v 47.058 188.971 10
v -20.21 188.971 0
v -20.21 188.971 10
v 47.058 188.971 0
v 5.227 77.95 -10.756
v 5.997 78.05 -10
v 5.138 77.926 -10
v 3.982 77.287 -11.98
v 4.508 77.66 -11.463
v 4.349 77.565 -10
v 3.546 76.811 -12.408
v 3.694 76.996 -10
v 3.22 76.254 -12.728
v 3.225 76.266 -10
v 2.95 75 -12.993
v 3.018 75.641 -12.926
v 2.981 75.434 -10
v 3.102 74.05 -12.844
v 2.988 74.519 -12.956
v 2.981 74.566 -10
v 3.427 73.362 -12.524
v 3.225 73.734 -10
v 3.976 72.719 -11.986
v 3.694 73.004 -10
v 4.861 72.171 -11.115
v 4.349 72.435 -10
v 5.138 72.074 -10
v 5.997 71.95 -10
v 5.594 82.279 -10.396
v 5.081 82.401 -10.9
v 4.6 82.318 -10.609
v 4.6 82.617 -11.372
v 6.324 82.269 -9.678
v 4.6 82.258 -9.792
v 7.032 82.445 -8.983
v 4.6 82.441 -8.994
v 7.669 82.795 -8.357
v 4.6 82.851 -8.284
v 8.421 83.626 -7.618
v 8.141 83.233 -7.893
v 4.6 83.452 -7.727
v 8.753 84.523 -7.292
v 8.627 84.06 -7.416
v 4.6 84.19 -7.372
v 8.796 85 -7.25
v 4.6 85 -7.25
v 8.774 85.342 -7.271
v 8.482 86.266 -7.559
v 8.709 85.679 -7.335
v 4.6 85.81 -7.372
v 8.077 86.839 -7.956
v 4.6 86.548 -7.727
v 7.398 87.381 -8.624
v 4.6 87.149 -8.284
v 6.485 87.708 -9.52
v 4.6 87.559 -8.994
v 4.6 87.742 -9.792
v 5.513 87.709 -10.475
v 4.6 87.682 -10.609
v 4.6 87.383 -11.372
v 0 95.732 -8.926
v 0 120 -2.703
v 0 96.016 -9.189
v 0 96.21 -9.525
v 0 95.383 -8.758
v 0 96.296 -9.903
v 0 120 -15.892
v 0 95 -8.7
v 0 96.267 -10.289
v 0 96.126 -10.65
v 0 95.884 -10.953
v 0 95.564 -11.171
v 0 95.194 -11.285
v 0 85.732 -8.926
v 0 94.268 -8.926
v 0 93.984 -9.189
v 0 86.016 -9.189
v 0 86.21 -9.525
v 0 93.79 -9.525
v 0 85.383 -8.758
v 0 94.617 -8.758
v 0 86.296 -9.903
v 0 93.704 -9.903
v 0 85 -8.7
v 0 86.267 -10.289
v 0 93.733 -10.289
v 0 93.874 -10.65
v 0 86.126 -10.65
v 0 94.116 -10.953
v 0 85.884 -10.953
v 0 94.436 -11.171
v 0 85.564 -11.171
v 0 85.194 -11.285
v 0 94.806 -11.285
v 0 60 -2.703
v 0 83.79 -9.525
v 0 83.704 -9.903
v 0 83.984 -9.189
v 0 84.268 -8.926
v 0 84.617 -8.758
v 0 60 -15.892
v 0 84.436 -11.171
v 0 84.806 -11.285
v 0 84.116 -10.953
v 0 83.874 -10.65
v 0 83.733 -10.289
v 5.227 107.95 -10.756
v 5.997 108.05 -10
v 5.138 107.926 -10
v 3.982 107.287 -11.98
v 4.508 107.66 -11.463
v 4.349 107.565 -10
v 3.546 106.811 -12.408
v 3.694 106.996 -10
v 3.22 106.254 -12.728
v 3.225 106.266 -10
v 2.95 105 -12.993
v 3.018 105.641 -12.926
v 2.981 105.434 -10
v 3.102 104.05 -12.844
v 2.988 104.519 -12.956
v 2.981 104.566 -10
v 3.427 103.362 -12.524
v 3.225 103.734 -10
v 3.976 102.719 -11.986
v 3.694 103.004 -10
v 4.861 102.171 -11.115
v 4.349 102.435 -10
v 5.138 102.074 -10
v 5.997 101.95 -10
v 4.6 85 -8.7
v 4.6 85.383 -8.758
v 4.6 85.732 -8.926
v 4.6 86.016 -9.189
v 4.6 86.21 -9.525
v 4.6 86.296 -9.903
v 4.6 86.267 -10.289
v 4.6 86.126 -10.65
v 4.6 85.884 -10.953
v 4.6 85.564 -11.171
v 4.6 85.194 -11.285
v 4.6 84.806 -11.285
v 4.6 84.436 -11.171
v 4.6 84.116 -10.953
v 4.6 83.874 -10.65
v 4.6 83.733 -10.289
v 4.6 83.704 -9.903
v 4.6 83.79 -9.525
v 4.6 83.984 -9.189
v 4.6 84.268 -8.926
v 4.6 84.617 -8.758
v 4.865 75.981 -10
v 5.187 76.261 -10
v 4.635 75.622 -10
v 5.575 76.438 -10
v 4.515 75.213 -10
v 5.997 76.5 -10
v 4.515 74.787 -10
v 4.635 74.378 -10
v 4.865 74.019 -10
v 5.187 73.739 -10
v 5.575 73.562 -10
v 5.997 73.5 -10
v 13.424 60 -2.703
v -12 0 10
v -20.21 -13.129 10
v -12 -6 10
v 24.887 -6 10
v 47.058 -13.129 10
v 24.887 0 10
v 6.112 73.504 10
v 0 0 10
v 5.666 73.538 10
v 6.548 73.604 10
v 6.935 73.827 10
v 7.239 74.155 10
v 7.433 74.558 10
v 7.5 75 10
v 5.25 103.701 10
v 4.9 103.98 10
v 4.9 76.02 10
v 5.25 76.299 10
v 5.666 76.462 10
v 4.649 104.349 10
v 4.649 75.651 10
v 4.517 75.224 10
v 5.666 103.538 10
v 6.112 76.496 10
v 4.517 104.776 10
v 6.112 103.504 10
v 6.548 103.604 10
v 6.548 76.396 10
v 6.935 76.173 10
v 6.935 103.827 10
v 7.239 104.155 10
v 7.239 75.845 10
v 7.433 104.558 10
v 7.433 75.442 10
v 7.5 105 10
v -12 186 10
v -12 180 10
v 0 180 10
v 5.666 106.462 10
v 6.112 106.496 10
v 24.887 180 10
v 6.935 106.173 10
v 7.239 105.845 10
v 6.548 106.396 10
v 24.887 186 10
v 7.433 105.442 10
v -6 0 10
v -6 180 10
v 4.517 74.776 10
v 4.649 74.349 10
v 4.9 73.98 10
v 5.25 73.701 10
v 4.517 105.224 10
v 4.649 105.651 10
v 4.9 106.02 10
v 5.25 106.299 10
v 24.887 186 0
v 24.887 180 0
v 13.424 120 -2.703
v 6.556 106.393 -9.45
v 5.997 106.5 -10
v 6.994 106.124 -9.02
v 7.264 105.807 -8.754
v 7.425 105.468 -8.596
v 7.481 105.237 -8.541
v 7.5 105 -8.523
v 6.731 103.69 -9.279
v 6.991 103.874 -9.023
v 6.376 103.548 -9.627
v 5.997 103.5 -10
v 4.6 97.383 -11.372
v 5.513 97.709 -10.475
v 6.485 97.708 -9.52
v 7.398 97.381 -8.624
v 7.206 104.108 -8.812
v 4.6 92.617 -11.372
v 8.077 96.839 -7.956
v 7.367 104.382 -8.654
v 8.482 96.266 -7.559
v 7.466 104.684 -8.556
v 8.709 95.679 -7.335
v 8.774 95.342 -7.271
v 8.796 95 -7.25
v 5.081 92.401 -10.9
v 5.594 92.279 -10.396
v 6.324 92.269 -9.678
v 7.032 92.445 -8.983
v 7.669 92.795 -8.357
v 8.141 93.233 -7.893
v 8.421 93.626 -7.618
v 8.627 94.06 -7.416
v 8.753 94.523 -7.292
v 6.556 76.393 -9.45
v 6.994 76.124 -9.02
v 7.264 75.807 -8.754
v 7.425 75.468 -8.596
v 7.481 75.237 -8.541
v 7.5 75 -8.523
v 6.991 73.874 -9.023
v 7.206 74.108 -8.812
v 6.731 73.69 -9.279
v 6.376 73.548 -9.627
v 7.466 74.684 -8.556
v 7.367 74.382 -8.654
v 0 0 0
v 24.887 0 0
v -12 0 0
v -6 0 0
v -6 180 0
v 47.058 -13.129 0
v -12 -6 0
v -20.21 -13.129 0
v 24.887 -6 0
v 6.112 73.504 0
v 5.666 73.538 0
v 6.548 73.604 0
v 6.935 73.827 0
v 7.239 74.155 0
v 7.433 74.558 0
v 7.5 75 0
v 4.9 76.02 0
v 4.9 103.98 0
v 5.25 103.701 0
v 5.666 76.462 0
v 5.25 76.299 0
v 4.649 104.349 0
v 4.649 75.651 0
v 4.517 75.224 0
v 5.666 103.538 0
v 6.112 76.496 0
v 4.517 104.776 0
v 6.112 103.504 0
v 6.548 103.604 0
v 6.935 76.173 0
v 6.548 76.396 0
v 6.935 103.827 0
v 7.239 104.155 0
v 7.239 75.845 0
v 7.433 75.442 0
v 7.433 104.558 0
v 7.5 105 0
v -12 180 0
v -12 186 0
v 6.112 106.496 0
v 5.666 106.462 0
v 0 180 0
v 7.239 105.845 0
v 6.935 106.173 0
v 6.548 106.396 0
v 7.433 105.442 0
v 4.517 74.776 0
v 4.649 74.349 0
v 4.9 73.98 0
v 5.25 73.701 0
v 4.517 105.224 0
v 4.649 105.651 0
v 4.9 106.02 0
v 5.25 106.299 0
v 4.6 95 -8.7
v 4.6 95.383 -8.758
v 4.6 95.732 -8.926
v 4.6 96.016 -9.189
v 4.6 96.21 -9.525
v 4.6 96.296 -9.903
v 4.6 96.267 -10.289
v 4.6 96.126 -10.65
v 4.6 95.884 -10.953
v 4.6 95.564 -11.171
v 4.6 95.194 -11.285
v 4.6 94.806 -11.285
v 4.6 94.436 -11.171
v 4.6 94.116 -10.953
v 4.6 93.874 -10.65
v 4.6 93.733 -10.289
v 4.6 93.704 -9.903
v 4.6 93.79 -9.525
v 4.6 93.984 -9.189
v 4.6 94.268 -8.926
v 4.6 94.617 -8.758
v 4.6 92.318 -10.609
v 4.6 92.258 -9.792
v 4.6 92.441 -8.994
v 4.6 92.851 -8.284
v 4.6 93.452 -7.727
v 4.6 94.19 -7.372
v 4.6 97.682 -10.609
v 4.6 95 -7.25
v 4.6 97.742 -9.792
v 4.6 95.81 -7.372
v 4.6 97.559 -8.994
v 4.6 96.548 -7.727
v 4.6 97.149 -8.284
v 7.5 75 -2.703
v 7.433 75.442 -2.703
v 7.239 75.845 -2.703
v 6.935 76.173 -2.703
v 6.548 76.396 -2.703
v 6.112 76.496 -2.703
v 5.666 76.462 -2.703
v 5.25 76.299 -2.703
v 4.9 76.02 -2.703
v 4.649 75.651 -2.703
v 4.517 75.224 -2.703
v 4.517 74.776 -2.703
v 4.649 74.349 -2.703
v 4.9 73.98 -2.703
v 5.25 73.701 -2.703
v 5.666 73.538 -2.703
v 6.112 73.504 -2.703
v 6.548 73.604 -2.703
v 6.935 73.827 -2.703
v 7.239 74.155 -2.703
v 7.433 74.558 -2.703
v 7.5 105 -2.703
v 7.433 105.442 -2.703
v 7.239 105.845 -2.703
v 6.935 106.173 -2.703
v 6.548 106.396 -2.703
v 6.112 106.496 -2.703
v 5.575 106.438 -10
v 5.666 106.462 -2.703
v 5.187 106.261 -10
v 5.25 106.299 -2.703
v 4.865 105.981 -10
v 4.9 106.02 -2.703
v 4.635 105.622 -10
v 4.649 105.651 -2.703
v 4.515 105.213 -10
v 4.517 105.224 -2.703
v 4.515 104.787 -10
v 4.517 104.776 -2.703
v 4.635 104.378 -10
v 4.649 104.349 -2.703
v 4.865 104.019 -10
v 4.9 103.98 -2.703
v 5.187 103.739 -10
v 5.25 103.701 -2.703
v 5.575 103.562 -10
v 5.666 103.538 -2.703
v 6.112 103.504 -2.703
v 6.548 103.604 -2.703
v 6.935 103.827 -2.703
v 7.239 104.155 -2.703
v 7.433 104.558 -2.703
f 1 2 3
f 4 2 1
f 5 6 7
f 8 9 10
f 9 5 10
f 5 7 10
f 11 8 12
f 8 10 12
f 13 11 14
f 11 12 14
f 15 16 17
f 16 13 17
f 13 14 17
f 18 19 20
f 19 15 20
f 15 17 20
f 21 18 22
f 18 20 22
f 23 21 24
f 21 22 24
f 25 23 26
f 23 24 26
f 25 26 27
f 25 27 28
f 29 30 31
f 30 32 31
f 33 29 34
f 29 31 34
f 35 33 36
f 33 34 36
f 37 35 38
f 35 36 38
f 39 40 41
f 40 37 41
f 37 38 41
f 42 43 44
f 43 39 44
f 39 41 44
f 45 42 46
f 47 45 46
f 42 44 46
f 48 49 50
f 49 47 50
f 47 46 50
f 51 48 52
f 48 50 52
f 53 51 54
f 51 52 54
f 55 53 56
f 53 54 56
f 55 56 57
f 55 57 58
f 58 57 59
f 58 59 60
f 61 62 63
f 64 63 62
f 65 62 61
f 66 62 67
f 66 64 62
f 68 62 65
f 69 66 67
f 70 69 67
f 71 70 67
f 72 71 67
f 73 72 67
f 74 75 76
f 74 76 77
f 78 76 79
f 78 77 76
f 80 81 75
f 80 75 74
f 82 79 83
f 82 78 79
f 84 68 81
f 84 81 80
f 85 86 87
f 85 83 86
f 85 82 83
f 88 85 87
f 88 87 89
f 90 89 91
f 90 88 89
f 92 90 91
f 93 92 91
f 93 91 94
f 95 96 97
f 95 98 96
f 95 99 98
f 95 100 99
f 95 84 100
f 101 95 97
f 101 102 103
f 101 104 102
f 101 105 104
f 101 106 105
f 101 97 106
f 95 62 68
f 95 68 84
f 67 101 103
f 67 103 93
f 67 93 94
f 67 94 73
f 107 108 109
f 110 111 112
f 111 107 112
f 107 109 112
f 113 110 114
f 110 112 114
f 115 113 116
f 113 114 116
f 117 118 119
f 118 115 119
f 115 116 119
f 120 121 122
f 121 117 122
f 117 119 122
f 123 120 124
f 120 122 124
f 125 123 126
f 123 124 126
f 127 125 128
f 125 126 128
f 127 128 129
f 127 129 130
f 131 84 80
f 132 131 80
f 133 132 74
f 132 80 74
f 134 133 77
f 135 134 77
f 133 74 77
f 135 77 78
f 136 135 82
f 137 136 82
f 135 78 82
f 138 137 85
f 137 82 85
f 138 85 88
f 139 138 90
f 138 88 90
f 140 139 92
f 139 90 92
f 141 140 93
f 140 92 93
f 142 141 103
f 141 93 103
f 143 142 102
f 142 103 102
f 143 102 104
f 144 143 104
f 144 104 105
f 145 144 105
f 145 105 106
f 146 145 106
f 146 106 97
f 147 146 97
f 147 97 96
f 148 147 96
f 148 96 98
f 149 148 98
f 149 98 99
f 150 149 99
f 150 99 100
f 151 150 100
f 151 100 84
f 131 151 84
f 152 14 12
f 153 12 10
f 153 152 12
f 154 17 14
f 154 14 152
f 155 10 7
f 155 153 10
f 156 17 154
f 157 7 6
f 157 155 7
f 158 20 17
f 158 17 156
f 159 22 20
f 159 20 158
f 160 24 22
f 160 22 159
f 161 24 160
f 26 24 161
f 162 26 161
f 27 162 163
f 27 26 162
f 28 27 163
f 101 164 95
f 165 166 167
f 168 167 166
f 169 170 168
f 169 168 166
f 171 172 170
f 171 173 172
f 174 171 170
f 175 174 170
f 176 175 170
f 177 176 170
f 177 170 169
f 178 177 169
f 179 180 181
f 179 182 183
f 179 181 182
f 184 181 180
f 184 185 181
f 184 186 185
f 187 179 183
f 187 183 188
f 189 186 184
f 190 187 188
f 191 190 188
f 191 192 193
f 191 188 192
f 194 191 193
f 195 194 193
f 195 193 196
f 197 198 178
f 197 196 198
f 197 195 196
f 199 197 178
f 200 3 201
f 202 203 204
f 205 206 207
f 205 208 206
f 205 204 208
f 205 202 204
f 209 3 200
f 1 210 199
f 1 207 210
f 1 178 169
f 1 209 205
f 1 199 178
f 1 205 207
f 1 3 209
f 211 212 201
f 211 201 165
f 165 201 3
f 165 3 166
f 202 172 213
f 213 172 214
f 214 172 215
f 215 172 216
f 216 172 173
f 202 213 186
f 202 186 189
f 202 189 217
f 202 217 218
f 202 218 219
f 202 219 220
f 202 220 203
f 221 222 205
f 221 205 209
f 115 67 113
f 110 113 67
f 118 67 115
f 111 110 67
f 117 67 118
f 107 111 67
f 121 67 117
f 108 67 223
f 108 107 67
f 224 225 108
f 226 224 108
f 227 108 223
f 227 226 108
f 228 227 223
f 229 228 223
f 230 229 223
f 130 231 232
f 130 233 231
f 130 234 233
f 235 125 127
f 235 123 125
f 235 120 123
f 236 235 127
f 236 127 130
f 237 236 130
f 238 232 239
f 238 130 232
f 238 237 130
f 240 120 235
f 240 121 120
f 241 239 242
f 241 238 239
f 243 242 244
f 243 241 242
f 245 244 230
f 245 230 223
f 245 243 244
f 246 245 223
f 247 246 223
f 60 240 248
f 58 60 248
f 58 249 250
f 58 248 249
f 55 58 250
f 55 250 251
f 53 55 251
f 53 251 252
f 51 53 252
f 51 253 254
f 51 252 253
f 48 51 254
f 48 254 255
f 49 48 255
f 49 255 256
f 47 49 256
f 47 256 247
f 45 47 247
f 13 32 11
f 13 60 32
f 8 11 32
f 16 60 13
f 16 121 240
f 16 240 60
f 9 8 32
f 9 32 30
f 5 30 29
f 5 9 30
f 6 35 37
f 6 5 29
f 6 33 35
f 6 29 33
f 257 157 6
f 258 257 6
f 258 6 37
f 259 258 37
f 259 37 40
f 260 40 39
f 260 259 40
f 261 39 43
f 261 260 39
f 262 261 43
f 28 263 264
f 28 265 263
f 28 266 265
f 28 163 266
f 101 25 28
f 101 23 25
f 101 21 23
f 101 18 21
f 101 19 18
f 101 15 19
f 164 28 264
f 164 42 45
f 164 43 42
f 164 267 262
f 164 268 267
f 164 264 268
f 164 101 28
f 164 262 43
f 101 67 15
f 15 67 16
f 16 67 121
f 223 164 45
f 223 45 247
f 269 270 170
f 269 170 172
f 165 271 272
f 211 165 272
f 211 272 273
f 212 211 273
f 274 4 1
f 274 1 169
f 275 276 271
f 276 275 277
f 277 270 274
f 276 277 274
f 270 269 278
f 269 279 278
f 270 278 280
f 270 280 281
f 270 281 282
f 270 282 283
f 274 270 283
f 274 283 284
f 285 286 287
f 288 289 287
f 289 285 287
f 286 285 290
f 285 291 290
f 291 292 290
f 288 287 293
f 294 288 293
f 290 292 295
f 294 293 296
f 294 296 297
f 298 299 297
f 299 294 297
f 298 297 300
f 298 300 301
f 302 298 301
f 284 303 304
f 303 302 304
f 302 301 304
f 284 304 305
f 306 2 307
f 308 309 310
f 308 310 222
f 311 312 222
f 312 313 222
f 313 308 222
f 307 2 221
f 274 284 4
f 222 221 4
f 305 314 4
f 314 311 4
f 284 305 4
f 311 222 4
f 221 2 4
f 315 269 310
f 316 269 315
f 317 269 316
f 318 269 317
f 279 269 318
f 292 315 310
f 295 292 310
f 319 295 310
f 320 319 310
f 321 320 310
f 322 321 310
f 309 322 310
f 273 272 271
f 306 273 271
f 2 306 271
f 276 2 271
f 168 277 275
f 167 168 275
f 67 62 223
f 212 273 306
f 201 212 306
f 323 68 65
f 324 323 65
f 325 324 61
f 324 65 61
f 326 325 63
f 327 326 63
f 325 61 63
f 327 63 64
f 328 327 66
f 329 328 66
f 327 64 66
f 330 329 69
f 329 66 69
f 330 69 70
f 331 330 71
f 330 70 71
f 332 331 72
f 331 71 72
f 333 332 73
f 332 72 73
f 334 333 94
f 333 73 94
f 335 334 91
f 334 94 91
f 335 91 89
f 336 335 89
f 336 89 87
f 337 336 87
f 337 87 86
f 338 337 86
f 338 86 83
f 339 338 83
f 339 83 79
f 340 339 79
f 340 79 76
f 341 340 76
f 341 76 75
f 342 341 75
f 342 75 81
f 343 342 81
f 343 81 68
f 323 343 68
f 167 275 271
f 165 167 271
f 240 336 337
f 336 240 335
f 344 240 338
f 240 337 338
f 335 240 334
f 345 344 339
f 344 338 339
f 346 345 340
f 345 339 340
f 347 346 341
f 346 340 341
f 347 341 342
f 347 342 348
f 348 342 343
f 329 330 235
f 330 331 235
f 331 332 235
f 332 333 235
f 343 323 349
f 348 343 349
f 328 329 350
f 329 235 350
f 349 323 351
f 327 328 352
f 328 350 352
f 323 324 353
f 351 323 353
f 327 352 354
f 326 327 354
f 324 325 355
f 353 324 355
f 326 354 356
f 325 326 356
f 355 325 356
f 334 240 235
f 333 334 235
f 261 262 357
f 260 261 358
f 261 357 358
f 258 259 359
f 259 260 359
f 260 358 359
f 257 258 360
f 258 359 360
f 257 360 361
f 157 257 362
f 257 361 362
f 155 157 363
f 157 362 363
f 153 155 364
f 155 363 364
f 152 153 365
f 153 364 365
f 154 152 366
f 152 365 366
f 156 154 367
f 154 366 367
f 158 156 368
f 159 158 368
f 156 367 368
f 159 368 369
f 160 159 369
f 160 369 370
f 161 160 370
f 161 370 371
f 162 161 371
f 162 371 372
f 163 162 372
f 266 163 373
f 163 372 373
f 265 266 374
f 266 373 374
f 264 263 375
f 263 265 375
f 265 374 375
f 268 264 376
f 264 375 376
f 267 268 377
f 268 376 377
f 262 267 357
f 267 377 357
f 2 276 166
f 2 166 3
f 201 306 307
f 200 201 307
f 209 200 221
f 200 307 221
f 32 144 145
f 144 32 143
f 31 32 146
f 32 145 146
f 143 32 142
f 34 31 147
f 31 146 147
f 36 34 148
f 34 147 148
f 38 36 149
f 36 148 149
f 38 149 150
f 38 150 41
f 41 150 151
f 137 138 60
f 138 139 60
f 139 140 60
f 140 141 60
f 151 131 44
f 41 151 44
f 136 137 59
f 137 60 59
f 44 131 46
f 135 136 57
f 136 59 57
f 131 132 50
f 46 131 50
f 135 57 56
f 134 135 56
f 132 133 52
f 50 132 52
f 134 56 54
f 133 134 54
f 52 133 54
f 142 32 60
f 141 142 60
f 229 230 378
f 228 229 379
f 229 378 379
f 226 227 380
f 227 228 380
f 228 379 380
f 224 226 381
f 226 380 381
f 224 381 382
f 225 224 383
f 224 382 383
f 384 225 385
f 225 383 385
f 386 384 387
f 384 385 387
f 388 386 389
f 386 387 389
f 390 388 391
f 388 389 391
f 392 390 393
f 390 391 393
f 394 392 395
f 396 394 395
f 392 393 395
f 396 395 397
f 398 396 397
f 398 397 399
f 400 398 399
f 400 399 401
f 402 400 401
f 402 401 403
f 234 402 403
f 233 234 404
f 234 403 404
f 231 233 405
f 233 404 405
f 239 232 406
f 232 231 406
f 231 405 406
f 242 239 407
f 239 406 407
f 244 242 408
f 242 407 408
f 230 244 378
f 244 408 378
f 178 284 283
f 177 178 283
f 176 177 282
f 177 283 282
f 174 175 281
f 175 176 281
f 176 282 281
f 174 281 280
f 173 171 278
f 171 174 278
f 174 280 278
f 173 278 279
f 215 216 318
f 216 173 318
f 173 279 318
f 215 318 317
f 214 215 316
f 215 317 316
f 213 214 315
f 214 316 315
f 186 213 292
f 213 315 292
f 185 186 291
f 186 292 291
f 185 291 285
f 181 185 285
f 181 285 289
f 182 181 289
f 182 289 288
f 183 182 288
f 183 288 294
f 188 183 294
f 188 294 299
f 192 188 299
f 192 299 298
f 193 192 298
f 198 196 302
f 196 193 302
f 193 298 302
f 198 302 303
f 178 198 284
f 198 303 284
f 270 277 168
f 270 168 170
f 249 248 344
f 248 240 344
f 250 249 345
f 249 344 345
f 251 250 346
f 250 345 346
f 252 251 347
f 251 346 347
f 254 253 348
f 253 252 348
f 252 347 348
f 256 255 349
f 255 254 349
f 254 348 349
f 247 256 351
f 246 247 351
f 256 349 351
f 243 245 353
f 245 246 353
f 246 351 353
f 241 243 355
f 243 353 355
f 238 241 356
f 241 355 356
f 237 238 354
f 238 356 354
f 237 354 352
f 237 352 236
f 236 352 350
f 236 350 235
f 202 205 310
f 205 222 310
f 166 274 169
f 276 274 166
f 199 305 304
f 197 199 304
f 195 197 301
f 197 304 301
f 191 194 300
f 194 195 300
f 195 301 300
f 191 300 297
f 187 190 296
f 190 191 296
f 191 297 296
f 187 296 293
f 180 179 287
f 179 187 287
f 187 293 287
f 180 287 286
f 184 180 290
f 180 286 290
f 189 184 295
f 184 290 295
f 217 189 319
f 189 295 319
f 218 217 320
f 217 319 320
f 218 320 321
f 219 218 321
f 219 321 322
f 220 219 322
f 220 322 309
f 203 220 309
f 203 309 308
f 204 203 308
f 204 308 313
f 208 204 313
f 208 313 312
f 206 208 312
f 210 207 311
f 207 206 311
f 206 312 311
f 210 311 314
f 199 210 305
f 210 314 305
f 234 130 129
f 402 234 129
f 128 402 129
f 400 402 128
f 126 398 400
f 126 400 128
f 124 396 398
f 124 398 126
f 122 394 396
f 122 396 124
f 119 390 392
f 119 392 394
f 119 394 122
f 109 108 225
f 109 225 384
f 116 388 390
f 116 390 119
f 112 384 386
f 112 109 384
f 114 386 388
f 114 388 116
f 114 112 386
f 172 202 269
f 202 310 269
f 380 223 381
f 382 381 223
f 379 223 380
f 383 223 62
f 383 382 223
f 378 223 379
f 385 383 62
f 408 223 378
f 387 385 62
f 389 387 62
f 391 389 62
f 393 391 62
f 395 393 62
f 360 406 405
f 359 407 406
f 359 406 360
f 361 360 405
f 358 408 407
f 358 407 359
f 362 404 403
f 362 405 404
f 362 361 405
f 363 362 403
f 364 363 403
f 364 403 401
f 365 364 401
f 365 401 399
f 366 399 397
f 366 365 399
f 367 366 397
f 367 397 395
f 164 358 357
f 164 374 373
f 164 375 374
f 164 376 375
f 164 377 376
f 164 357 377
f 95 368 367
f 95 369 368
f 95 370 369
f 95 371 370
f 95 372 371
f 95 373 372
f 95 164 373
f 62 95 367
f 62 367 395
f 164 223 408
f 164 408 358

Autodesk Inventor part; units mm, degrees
ref_plane "YZ Plane" through (0, 0, 0) normal (1, 0, 0) x (0, 1, 0)
ref_plane "XZ Plane" through (0, 0, 0) normal (0, 1, 0) x (-1, 0, 0)
ref_plane "XY Plane" through (0, 0, 0) normal (0, 0, 1) x (1, 0, 0)
ref_plane "РабПлоскость1" through (0, 0, 0) normal (0, 0, 1) x (1, 0, 0)
sketch "Эскиз1" plane through (0, 0, 0) normal (0, 0, 1) x (1, 0, 0)
  line L0 (-20.21, 188.9707) -> (47.0583, 188.9707)
  line L1 (47.0583, 188.9707) -> (47.0583, -13.1291)
  line L2 (47.0583, -13.1291) -> (-20.21, -13.1291)
  line L3 (-20.21, -13.1291) -> (-20.21, 188.9707)
  line L4 (220, -6) -> (168.1947, -6)
  line L5 (168.1947, 0) -> (168.1947, -6)
  line L6 (168.1947, 0) -> (220, 0)
  line L7 (220, 0) -> (220, -6)
  line L8 (9.8053, -6) -> (-12, -6)
  line L9 (-12, -6) -> (-12, 0)
  line L10 (-12, 0) -> (9.8053, 0)
  line L11 (9.8053, 0) -> (9.8053, -6)
  line L12 (220, 180) -> (168.1947, 180)
  line L13 (168.1947, 186) -> (168.1947, 180)
  line L14 (168.1947, 186) -> (220, 186)
  line L15 (220, 186) -> (220, 180)
  line L16 (9.8053, 180) -> (-12, 180)
  line L17 (-12, 180) -> (-12, 186)
  line L18 (-12, 186) -> (9.8053, 186)
  line L19 (9.8053, 186) -> (9.8053, 180)
  line L20 (0, 180) -> (0, 0)
  line L21 (0, 0) -> (-6, 0)
  line L22 (-6, 0) -> (-6, 180)
  line L23 (-6, 180) -> (0, 180)
  circle A0 centre (-3, 175) radius 1.5
  circle A1 centre (-3, 5) radius 1.5
  line L24 (9.8053, -6) -> (24.8871, -6)
  line L25 (24.8871, -6) -> (24.8871, 0)
  line L26 (24.8871, 0) -> (9.8053, 0)
  line L27 (9.8053, 0) -> (9.8053, -6)
  line L28 (9.8053, 180) -> (24.8871, 180)
  line L29 (24.8871, 180) -> (24.8871, 188.9707)
  line L30 (24.8871, 188.9707) -> (9.8053, 188.9707)
  line L31 (9.8053, 188.9707) -> (9.8053, 180)
  circle A2 centre (6, 75) radius 1.5
  circle A3 centre (6, 105) radius 1.5
  line L32 (-1364.1034, 90) -> (1460.214, 90)
  line L33 (9.8053, 186) -> (24.8871, 186)
  dimension "d0" = 3
  dimension "d1" = 3
  dimension "d2" = 6
  dimension "d3" = 6
  dimension "d4" = 15
  dimension "d5" = 15
ref_plane "РабПлоскость2" through (104, 75, -42) normal (0, 1, 0) x (-1, 0, 0)
sketch "Эскиз2" plane through (104, 75, -42) normal (0, 1, 0) x (-1, 0, 0)
  line L0 (104, 42) -> (104, 26.1085)
  line L1 (104, 26.1085) -> (90.5759, 39.2974)
  line L2 (90.5759, 39.2974) -> (104, 39.2974)
extrude "Выдавливание2" add sketch "Эскиз2" along normal mid plane 30
ref_plane "РабПлоскость3" through (104, 90, -42) normal (0, 1, 0) x (-1, 0, 0)
mirror "Зеркальное отражение1" about plane through (104, 90, -42) normal (0, 1, 0) of "Выдавливание2"
ref_plane "РабПлоскость7" through (0, 0, 0) normal (0, 0, 1) x (1, 0, 0)
sketch "Эскиз3" plane through (0, 0, 0) normal (0, 0, 1) x (1, 0, 0)
  line L0 (47.0583, 188.9707) -> (-20.21, 188.9707) projected
  line L1 (-20.21, 188.9707) -> (-20.21, -13.1291) projected
  line L2 (-20.21, -13.1291) -> (47.0583, -13.1291) projected
  line L3 (47.0583, -13.1291) -> (47.0583, 188.9707) projected
  circle A0 centre (6, 105) radius 1.5 projected
  circle A1 centre (6, 75) radius 1.5 projected
  line L4 (-12, 186) -> (24.8871, 186) projected
  line L5 (24.8871, 186) -> (24.8871, 180) projected
  line L6 (24.8871, 180) -> (0, 180) projected
  line L7 (0, 180) -> (0, 0) projected
  line L8 (0, 0) -> (24.8871, 0) projected
  line L9 (24.8871, 0) -> (24.8871, -6) projected
  line L10 (24.8871, -6) -> (-12, -6) projected
  line L11 (-12, -6) -> (-12, 0) projected
  line L12 (-12, 0) -> (-6, 0) projected
  line L13 (-6, 0) -> (-6, 180) projected
  line L14 (-6, 180) -> (-12, 180) projected
  line L15 (-12, 180) -> (-12, 186) projected
extrude "Выдавливание3" cut sketch "Эскиз3" against normal blind 13.891 contours A0 | A1
ref_plane "РабПлоскость4" through (0, 0, -10) normal (0, 0, -1) x (-1, 0, 0)
sketch "Эскиз4" plane through (0, 0, -10) normal (0, 0, -1) x (-1, 0, 0)
  line L0 (0, 60) -> (-13.4241, 60) projected
  line L1 (0, 120) -> (0, 60) projected
  line L2 (0, 120) -> (-13.4241, 120) projected
  circle A0 centre (-6, 105) radius 3.0499
  line L3 (-13.4241, 60) -> (-13.4241, 120) projected
  point P0 (0, 0)
extrude "Выдавливание4" cut sketch "Эскиз4" along normal blind 30 contours A0
mirror "Зеркальное отражение2" about plane through (104, 90, -42) normal (0, 1, 0) of "Выдавливание4"
ref_plane "РабПлоскость6" through (0, 0, 0) normal (-1, 0, 0) x (0, 0, 1)
sketch "Эскиз5" plane through (0, 0, 0) normal (-1, 0, 0) x (0, 0, 1)
  circle A0 centre (-10, 95) radius 1.3
  circle A1 centre (-10, 85) radius 1.3
  line L0 (-19.0698, 90) -> (3.1783, 90) projected
  line L1 (-3, -13.1291) -> (-3, 188.9707) projected
  point P0 (0, 0)
  dimension "d16" = 2.6
  dimension "d17" = 5
  dimension "d18" = 5
  dimension "d19" = 2.6
  dimension "d20" = 7
  dimension "d21" = 7
extrude "Выдавливание5" cut sketch "Эскиз5" against normal up to surface surface through (13.4241, 75, -2.7026) normal (0.7008276, 0, -0.7133306)
ref_plane "РабПлоскость5" through (4.6, 0, 0) normal (-1, 0, 0) x (0, 0, 1)
sketch "Эскиз6" plane through (4.6, 0, 0) normal (-1, 0, 0) x (0, 0, 1)
  circle A0 centre (-10, 85) radius 1.3 projected
  circle A1 centre (-10, 95) radius 1.3 projected
  line L0 (-3, 120) -> (-15.8915, 120) projected
  line L1 (-15.8915, 120) -> (-15.8915, 60) projected
  line L2 (-3, 60) -> (-15.8915, 60) projected
  line L3 (-3, 0) -> (-3, 60) projected
  line L4 (0, 0) -> (-3, 0) projected
  line L5 (0, 180) -> (0, 0) projected
  line L6 (0, 180) -> (-3, 180) projected
  line L7 (-3, 120) -> (-3, 180) projected
  circle A2 centre (-10, 85) radius 2.75
  circle A3 centre (-10, 95) radius 2.75
  point P0 (0, 0)
  dimension "d25" = 5.5
  dimension "d26" = 5.5
extrude "Выдавливание6" cut sketch "Эскиз6" against normal blind 10 contours A0 | A2 | A3
extrude "Выдавливание7" add sketch "Эскиз1" along normal blind 10 contours L0 L31 L18 L17 L16 L22 L32 L3 | L0 L29 L33 L31 | L32 L22 L10 L9 L8 L24 L25 L26 L20 L1 L2 L3 | L0 L1 L32 L20 L16 L28 L29
properties part number "4s"
